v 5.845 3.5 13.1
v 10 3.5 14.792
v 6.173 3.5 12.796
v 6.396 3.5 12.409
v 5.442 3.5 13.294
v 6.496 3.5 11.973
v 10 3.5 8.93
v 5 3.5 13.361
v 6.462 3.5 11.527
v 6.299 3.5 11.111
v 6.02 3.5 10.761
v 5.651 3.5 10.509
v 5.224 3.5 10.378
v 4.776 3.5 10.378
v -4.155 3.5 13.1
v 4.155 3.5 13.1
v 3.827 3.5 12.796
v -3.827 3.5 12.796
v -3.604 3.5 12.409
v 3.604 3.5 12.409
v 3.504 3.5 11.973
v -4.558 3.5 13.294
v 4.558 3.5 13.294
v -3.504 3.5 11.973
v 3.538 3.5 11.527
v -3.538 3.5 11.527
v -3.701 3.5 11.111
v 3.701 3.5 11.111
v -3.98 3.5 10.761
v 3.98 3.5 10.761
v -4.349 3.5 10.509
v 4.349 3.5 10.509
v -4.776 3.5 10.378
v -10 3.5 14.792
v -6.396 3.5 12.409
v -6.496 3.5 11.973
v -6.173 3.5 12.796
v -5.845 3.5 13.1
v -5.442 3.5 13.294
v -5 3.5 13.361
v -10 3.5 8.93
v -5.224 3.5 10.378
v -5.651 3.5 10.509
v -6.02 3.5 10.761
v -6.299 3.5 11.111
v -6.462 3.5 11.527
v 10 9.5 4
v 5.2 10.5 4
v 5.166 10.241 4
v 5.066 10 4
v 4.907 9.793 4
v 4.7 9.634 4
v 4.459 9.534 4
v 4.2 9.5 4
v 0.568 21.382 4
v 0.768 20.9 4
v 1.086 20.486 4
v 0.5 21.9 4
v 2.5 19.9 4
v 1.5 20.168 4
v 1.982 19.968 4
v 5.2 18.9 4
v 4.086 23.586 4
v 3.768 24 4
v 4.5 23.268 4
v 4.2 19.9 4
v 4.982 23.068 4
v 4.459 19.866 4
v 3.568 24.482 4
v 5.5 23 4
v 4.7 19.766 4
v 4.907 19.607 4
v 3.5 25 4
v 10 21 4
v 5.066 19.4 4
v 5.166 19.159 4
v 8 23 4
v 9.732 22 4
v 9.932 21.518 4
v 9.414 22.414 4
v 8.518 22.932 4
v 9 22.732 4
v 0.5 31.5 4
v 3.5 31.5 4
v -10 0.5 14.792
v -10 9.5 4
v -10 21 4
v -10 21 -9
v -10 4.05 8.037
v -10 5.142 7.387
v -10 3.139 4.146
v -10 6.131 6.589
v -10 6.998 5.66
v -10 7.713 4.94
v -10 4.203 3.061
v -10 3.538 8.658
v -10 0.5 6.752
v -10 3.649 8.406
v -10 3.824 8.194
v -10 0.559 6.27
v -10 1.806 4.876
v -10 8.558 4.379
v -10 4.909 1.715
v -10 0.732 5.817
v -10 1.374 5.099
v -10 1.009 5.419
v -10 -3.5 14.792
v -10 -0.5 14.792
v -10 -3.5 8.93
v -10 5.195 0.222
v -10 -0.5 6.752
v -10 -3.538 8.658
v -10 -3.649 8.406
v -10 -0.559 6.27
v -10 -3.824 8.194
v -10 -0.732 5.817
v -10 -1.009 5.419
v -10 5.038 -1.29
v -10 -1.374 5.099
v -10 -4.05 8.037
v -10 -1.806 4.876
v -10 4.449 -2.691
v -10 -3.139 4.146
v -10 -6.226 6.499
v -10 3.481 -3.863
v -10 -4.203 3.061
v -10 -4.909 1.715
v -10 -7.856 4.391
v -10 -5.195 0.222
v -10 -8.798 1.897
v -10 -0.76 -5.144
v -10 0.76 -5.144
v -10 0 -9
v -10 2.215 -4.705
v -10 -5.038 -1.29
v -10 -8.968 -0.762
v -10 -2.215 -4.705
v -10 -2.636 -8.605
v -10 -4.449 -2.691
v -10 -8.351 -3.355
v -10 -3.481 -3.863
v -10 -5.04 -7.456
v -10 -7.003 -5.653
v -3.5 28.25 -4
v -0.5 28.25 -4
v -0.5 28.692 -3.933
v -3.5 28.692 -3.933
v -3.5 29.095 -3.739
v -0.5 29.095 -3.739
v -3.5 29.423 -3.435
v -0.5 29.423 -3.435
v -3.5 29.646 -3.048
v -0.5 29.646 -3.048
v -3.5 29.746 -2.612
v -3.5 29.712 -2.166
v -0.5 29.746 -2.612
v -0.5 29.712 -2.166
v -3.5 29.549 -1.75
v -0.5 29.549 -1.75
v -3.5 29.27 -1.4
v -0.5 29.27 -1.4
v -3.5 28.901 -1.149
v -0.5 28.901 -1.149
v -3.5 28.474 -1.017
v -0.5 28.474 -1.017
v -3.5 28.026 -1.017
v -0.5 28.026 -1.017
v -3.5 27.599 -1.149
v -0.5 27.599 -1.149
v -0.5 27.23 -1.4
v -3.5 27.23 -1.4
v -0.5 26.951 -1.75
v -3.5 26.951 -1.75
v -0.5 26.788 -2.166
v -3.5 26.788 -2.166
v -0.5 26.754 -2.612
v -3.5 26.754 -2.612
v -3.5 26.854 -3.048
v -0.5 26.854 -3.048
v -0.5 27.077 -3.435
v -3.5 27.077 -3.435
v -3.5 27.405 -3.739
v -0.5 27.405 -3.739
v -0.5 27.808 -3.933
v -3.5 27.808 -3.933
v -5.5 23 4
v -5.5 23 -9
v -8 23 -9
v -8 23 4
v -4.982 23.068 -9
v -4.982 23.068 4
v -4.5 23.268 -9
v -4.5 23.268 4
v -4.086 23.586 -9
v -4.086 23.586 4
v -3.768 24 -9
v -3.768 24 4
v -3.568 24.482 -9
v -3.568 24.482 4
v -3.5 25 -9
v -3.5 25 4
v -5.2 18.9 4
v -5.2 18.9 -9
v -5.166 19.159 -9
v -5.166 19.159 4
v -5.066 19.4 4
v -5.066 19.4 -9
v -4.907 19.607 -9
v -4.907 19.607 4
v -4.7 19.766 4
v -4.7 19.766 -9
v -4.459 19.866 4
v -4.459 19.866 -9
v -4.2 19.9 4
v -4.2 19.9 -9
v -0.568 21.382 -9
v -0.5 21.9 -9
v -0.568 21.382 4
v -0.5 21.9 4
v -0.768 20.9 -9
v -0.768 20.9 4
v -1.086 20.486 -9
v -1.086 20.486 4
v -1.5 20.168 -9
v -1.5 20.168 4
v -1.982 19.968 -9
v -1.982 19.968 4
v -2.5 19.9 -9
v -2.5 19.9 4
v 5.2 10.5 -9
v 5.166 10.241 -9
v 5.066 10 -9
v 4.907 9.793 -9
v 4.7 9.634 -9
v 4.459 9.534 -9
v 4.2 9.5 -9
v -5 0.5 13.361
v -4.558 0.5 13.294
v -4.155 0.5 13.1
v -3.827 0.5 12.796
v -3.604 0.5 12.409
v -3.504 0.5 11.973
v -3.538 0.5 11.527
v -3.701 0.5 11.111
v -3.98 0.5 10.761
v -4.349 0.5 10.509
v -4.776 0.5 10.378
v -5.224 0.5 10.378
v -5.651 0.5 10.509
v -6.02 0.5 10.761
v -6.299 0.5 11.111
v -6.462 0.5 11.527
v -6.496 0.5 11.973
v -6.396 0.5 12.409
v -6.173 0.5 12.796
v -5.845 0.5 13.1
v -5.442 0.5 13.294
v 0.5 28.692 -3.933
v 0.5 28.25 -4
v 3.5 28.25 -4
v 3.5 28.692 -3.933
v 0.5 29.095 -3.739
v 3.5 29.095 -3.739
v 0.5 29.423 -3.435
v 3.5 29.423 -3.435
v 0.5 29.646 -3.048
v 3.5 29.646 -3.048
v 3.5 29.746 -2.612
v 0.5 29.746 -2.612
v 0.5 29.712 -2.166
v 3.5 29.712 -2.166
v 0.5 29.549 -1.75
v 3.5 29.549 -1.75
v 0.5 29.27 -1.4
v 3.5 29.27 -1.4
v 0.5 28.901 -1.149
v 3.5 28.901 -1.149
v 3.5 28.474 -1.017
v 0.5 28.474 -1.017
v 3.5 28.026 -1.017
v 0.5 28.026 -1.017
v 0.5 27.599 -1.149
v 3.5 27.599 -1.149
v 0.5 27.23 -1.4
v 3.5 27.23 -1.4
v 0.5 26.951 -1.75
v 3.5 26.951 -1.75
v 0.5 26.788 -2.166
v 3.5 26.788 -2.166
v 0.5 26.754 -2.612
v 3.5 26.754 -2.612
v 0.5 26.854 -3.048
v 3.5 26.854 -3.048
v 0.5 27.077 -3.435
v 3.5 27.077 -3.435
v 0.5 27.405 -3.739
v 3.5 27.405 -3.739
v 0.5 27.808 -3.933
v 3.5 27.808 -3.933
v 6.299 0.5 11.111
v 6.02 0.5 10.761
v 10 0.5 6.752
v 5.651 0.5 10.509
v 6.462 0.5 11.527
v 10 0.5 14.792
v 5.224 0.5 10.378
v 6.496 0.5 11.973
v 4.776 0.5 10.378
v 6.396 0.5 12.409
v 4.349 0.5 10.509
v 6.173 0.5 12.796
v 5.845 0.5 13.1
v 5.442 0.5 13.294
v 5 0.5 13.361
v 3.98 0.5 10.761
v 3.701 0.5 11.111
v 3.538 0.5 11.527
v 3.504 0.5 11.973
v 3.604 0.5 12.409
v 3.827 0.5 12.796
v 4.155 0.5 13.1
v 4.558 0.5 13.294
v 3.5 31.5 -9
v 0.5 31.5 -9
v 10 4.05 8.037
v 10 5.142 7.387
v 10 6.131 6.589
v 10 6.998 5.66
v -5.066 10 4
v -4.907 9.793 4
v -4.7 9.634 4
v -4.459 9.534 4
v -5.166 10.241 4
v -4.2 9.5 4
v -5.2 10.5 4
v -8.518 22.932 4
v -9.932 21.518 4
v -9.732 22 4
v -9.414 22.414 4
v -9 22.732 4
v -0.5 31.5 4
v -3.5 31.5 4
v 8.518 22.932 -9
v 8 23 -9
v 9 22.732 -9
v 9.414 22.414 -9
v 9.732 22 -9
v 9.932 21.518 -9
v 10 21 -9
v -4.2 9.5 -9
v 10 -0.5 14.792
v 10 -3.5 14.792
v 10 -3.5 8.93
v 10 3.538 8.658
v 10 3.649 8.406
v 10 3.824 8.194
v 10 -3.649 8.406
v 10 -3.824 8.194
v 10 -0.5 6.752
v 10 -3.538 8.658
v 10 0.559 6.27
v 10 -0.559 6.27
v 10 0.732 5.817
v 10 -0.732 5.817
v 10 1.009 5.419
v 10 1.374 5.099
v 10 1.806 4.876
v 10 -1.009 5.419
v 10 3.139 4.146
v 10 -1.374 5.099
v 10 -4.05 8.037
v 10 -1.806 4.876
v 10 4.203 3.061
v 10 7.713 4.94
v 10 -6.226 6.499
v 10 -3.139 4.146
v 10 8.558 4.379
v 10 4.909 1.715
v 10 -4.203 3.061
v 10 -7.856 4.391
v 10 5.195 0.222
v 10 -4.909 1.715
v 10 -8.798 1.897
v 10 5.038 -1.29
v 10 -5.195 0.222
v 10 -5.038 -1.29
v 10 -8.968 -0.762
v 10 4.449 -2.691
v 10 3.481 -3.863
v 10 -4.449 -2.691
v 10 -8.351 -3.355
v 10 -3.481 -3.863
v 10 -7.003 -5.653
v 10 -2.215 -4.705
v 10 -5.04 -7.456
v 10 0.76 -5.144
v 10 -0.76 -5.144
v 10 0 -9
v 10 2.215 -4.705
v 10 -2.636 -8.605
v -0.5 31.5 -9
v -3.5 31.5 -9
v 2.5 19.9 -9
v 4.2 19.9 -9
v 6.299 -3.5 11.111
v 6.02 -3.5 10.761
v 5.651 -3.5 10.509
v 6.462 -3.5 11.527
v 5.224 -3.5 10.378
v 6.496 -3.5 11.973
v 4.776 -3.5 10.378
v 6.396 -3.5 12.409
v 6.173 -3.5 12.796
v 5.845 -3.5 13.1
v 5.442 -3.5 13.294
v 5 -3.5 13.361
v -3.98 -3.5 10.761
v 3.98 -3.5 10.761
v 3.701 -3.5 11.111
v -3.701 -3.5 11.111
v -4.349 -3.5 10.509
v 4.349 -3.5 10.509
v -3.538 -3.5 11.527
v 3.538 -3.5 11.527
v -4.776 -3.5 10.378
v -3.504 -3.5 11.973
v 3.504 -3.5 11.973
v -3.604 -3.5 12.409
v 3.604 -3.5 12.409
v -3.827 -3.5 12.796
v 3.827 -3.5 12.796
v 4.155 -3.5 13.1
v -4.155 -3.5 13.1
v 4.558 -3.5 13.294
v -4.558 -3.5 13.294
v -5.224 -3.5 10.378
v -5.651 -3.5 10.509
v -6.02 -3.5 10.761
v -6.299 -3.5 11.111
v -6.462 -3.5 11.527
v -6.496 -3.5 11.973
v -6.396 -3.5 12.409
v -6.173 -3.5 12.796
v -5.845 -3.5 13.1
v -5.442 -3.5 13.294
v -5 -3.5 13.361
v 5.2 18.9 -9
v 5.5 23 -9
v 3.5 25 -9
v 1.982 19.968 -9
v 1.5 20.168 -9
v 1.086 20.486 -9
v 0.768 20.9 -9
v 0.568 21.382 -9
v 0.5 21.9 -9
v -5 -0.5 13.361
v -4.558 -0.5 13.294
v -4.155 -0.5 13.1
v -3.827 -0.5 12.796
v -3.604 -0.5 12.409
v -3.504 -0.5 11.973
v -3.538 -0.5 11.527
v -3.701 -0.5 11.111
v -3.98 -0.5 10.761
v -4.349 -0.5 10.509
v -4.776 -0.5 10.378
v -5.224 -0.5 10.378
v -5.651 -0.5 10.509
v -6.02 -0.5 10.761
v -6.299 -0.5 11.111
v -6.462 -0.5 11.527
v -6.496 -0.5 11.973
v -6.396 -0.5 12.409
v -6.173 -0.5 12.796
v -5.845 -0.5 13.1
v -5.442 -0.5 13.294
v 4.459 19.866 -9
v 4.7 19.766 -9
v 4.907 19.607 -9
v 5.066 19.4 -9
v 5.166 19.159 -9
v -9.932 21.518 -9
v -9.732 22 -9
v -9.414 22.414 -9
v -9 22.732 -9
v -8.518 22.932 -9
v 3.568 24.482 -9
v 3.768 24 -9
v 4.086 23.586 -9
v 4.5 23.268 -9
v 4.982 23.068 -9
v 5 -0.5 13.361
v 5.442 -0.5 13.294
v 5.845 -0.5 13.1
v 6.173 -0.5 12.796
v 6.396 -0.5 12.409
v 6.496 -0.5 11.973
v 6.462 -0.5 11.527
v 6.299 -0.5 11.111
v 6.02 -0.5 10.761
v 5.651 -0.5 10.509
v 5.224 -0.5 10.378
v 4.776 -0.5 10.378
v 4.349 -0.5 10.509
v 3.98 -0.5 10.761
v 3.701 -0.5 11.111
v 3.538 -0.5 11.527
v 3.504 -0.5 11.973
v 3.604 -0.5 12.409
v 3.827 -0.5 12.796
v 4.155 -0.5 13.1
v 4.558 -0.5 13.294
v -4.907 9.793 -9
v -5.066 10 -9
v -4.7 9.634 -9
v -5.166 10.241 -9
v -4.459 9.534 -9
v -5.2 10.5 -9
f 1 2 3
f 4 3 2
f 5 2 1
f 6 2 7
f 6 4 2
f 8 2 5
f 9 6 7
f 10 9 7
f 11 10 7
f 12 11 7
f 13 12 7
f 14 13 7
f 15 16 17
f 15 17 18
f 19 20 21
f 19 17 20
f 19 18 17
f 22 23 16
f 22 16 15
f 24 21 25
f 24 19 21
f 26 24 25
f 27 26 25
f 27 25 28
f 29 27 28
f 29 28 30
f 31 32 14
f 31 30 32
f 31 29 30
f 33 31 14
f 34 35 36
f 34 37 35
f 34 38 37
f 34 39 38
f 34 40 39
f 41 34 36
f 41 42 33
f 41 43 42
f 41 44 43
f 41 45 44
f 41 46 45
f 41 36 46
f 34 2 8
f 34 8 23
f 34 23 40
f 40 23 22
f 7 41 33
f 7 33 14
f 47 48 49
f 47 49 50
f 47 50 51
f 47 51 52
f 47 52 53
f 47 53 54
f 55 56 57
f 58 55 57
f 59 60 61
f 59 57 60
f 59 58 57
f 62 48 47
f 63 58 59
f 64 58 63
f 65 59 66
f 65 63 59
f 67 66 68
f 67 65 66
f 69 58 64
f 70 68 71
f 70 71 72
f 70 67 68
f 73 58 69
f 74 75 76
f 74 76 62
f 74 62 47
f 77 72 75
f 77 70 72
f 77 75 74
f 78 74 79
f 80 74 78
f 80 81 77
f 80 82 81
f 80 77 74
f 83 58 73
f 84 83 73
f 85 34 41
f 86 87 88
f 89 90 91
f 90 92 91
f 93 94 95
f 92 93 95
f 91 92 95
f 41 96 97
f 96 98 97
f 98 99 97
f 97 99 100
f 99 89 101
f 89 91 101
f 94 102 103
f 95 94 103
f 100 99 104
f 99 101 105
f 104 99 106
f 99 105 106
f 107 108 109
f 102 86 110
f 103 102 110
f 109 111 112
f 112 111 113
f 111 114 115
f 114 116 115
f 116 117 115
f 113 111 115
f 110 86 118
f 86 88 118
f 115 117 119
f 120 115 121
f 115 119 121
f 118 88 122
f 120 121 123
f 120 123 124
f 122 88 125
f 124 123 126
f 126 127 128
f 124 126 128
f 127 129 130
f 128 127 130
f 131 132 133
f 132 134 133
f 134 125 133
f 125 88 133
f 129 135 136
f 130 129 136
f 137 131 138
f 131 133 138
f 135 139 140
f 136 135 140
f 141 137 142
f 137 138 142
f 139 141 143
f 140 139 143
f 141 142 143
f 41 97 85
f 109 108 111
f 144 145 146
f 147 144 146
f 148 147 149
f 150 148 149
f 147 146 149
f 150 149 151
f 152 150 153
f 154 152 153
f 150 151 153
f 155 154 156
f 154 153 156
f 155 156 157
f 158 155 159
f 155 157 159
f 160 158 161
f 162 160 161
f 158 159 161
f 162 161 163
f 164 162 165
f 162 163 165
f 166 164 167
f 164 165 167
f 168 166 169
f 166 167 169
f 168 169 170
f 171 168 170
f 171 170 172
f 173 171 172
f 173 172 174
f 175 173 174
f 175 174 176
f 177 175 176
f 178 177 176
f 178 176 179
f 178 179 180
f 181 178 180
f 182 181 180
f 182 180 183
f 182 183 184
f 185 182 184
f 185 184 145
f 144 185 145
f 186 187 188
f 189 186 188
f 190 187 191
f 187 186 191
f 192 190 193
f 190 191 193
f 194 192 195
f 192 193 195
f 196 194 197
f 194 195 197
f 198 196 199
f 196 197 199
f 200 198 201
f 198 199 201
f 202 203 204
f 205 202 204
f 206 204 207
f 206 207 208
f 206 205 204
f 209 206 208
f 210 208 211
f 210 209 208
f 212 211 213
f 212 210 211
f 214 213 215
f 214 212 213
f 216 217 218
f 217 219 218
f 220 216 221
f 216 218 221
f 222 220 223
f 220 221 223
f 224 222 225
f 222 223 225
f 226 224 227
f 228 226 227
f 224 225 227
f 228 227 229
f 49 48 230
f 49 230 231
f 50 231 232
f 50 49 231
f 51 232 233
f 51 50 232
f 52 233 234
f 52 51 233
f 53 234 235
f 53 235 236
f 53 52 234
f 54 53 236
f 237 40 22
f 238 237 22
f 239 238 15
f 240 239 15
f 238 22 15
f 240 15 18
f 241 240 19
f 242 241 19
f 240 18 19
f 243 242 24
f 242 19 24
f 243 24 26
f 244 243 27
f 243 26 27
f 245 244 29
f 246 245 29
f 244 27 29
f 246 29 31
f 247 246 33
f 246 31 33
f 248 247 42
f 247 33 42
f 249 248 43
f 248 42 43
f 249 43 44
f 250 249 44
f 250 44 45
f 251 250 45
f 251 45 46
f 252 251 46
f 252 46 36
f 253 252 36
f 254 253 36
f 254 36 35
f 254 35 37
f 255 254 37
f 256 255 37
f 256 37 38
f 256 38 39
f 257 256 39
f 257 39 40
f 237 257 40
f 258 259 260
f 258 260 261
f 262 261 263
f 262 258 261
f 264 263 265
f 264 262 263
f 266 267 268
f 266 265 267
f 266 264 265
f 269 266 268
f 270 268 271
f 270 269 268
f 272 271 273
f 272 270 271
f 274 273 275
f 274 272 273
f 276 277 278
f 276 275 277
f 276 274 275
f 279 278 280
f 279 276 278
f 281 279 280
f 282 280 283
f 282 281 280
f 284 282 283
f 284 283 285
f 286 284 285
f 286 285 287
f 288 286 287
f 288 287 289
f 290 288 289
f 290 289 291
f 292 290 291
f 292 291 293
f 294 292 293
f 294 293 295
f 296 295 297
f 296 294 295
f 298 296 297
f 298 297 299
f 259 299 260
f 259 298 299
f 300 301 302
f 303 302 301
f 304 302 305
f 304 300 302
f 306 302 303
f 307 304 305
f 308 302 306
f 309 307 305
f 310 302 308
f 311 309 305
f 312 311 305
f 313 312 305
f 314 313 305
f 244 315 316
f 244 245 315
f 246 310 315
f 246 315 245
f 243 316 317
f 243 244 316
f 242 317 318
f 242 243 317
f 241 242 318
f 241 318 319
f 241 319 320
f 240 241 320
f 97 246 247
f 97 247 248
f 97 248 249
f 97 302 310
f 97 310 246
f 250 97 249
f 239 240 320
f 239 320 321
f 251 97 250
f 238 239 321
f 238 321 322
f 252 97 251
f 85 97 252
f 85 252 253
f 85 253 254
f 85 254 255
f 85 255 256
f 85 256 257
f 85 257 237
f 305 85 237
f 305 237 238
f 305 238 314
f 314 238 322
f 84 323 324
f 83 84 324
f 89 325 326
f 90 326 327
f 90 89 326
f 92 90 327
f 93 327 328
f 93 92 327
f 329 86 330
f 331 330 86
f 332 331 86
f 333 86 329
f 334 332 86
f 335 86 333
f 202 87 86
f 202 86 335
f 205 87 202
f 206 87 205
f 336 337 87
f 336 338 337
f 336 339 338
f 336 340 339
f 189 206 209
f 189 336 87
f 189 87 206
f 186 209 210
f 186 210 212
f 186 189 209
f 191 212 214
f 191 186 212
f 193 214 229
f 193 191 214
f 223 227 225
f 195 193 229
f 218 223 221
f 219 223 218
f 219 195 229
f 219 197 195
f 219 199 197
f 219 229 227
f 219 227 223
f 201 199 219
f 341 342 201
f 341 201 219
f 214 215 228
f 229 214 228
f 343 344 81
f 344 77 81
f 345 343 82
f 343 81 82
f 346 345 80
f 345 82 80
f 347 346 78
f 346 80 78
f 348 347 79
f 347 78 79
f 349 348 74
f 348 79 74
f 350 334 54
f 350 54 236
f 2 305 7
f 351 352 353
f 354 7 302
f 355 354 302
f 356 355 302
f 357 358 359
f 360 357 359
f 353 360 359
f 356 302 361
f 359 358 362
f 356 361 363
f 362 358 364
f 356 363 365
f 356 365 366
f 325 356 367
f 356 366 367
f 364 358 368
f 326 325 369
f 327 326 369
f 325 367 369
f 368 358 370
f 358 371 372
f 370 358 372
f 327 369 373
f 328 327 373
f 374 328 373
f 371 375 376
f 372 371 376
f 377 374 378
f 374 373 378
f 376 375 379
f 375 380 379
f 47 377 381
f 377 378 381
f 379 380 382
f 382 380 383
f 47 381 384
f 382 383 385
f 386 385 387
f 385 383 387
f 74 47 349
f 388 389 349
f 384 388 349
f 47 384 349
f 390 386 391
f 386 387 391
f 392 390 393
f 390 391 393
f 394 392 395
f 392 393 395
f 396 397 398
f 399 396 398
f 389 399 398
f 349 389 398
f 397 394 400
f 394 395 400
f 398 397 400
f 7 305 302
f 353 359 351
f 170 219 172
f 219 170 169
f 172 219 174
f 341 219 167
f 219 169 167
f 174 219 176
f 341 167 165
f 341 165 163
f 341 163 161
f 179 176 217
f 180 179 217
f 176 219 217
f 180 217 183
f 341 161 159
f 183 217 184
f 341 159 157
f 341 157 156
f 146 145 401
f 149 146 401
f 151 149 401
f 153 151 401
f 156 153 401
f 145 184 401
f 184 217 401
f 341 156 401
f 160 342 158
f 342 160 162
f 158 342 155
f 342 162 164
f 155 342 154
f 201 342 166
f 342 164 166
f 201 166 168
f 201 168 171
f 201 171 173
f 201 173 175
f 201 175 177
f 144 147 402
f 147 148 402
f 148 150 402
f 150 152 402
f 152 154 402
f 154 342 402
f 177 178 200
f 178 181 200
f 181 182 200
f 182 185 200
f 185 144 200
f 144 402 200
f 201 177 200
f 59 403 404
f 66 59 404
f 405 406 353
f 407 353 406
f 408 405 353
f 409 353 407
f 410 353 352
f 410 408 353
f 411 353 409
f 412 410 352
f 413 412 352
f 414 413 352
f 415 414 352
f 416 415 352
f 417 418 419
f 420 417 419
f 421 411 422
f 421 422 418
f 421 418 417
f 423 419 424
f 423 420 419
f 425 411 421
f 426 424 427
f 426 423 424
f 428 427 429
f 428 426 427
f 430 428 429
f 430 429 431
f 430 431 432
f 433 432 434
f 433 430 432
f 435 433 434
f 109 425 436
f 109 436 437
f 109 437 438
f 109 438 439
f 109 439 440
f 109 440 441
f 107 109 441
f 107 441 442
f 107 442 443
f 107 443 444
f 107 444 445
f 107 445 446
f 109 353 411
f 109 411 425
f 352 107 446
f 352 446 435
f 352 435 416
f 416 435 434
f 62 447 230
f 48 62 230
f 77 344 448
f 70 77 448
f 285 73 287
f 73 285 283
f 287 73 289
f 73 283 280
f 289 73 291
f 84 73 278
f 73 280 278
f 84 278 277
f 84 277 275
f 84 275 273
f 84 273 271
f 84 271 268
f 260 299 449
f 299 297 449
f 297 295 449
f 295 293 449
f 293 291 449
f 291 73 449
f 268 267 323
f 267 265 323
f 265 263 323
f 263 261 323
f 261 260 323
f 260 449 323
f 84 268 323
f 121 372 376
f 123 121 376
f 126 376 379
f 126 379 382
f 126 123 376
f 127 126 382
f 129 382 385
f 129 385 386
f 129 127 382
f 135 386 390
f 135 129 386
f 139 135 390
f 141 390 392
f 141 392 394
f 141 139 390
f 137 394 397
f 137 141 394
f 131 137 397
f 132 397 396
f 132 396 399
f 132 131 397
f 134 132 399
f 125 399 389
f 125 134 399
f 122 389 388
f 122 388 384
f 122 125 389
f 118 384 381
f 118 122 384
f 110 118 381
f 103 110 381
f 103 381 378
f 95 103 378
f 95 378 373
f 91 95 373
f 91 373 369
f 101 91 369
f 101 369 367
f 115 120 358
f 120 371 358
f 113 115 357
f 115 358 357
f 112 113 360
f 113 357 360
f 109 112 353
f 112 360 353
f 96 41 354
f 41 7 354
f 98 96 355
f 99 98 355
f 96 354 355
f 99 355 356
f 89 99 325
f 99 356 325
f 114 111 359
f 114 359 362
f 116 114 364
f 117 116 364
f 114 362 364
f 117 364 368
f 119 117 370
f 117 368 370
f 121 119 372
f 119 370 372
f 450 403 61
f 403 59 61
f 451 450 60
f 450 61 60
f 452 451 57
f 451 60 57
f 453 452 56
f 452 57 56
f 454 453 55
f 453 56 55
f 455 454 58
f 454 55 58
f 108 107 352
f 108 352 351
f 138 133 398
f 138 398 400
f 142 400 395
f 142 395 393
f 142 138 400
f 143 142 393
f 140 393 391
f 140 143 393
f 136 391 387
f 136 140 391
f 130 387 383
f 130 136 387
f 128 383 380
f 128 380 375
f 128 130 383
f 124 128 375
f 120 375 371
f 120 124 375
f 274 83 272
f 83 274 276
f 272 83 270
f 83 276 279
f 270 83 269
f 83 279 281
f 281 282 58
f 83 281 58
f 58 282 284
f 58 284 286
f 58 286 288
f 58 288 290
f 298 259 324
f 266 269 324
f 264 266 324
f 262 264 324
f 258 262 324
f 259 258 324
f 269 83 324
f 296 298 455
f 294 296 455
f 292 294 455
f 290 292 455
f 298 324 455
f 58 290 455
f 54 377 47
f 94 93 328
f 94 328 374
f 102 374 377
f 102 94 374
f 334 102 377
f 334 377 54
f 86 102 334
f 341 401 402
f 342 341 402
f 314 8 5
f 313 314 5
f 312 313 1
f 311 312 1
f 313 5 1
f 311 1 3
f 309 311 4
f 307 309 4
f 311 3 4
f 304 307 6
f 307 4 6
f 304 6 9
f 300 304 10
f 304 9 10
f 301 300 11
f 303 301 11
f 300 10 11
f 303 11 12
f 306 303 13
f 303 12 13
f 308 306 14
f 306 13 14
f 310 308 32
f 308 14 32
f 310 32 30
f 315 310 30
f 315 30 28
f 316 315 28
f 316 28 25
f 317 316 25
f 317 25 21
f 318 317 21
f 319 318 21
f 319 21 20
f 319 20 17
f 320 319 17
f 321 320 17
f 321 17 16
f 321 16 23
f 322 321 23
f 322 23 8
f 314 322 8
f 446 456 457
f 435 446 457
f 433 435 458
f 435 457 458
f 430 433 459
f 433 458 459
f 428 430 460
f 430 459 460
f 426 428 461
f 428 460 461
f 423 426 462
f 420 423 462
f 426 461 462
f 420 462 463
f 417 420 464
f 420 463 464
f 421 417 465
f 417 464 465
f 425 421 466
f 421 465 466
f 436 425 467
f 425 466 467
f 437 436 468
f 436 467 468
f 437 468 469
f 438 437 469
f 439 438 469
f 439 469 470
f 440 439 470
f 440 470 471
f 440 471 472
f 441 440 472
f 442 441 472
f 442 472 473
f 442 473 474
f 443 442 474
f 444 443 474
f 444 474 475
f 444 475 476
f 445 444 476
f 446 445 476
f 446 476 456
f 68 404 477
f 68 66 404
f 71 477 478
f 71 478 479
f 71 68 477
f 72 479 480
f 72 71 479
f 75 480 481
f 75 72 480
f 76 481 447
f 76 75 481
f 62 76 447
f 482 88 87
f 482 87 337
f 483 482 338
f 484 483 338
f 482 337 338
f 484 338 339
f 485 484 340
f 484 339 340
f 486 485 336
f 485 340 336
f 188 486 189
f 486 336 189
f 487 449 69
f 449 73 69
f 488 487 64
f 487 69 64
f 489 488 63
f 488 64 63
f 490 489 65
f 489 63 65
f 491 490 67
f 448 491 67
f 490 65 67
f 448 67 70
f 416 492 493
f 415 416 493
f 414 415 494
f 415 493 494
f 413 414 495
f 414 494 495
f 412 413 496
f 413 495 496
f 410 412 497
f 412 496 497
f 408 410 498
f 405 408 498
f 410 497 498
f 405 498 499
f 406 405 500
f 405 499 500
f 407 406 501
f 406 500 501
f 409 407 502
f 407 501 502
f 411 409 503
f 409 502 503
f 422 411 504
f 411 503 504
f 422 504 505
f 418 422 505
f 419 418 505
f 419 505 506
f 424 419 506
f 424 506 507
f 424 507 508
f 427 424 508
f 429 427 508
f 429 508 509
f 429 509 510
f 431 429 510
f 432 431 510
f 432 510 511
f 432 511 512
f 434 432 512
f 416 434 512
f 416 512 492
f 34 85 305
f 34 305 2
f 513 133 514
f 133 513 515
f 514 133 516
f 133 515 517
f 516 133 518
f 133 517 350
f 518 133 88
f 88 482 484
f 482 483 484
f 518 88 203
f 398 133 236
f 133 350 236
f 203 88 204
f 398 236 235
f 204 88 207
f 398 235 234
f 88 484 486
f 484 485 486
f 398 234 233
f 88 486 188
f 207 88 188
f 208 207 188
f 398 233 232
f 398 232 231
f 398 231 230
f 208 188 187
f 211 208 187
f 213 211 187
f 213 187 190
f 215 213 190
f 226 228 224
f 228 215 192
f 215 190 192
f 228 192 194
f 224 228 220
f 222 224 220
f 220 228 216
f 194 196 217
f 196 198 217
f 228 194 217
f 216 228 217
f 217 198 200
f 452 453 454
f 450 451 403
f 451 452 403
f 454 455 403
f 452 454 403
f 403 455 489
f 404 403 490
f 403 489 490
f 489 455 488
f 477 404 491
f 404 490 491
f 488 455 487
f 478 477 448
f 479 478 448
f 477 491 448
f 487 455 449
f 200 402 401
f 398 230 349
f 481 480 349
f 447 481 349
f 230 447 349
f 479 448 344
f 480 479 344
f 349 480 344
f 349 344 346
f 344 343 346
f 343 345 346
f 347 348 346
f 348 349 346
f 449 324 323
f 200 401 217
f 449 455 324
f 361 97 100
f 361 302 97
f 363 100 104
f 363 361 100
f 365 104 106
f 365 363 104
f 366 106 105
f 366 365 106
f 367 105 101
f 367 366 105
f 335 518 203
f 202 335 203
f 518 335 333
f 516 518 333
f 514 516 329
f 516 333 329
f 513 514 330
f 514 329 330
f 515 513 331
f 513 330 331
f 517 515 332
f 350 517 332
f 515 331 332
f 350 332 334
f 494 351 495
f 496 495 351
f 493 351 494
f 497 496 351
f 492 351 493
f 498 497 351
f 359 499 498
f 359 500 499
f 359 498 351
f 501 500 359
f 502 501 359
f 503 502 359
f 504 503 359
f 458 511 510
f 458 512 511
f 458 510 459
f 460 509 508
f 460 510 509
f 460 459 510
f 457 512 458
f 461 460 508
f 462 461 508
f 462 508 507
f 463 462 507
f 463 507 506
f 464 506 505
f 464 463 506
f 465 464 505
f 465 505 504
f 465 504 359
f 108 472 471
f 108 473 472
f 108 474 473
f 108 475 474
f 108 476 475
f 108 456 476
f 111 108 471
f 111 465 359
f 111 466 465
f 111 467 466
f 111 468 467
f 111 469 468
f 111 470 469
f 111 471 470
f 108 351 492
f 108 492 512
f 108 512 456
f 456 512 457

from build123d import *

# Parameters (mm, degrees)
BOSS_EXTRUDE1_DEPTH            = 10
BOSS_EXTRUDE1_DEPTH_BACK       = 10
FILLET1_R                      = 1
BOSS_EXTRUDE2_START            = -10
BOSS_EXTRUDE2_DEPTH            = 20
FILLET2_R                      = 5
BOSS_EXTRUDE3_DEPTH            = 4
BOSS_EXTRUDE3_DEPTH_BACK       = 9
FILLET3_R                      = 1
FILLET4_R                      = 2
CUT_EXTRUDE1_REACH             = 35.208
SKETCH4_R                      = 1.5
CUT_EXTRUDE2_REACH             = 38.208
SKETCH5_R                      = 1.5
CUT_EXTRUDE2_DIRECTION_2_REACH = 38.208
FILLET5_R                      = 2


with BuildPart() as part:
    # Sketch1 → Boss-Extrude1 (new, two sides: drawn at the far end of the back side and taken through both)
    with BuildSketch(Plane(origin=(0, 0, 0), x_dir=(0, 0, -1), z_dir=(1, 0, 0)).offset(-BOSS_EXTRUDE1_DEPTH_BACK)):
        with BuildLine():
            Line((-5.175905718, 0.5), (-14.791561976, 0.5))
            Line((-14.791561976, 0.5), (-14.791561976, 3.5))
            Line((-14.791561976, 3.5), (-8.291561976, 3.5))
            ThreePointArc((-8.291561976, 3.5), (9, 0), (-8.291561976, -3.5))
            Line((-8.291561976, -3.5), (-14.791561976, -3.5))
            Line((-14.791561976, -3.5), (-14.791561976, -0.5))
            Line((-14.791561976, -0.5), (-5.175905718, -0.5))
            ThreePointArc((-5.175905718, -0.5), (5.2, 0), (-5.175905718, 0.5))
        make_face()
    extrude(amount=BOSS_EXTRUDE1_DEPTH + BOSS_EXTRUDE1_DEPTH_BACK)

    # Fillet1
    fillet1_edges = [part.edges().sort_by_distance(p)[0] for p in [
        (0, 3.5, 8.291561976),
        (0, -3.5, 8.291561976),
    ]]
    fillet(fillet1_edges, radius=FILLET1_R)

    # Sketch2 → Boss-Extrude2 (add)
    with BuildSketch(Plane(origin=(0, 0, 0), x_dir=(0, 0, -1), z_dir=(1, 0, 0)).offset(BOSS_EXTRUDE2_START)):
        with BuildLine():
            Line((-4, 8.062257748), (-4, 9.5))
            Line((-4, 9.5), (4, 9.5))
            Line((4, 9.5), (9, 9.5))
            Line((9, 9.5), (9, 0))
            ThreePointArc((9, 0), (7.64852927, 4.74341649), (4, 8.062257748))
            Line((4, 8.062257748), (-4, 8.062257748))
        make_face()
    extrude(amount=BOSS_EXTRUDE2_DEPTH)

    # Fillet2
    # the kernel refuses this fillet: 5 mm, written as the material it adds along each edge
    with BuildSketch(Plane(origin=(-10, 8.062257748, 4), x_dir=(0, -0.5399133181781692, 0.8417206239922121), z_dir=(1, 0, 0))) as fillet2_piece_1:
        with BuildLine():
            CenterArc((2.519874472, -4.969901053), FILLET2_R, 96.289938273, 34.950941651)
            Line((-0.77625619, -1.210177305), (-0.842178803, -1.13498283))
            ThreePointArc((-0.842178803, -1.13498283), (-0.472300157, -0.551097321), (-0.084172062, 0.053991332))
            Line((-0.084172062, 0.053991332), (0.010955976, 0.099398021))
            ThreePointArc((0.010955976, 0.099398021), (0.986037837, 0.045821895), (1.961119698, 0.099398021))
            Line((1.961119698, 0.099398021), (1.972075674, 0))
        make_face()
    extrude(amount=20)

    # Sketch3 → Boss-Extrude3 (add, two sides: drawn at the far end of the back side and taken through both)
    with BuildSketch(Plane.XY.offset(-BOSS_EXTRUDE3_DEPTH_BACK)):
        Polygon((-5.2, 9.5), (-5.2, 19.9), (-0.5, 19.9), (-0.5, 31.5), (-3.5, 31.5), (-3.5, 23), (-10, 23), (-10, 9.5), align=None)
        Polygon((5.2, 19.9), (5.2, 9.5), (10, 9.5), (10, 23), (3.5, 23), (3.5, 31.5), (0.5, 31.5), (0.5, 19.9), align=None)
    extrude(amount=BOSS_EXTRUDE3_DEPTH + BOSS_EXTRUDE3_DEPTH_BACK)

    # Fillet3
    fillet3_edges = [part.edges().sort_by_distance(p)[0] for p in [
        (-5.2, 9.5, -2.5),
        (-5.2, 19.9, -2.5),
        (5.2, 19.9, -2.5),
        (5.2, 9.5, -2.5),
    ]]
    fillet(fillet3_edges, radius=FILLET3_R)

    # Fillet4
    fillet4_edges = [part.edges().sort_by_distance(p)[0] for p in [
        (-3.5, 23, -2.5),
        (-10, 23, -2.5),
        (10, 23, -2.5),
        (3.5, 23, -2.5),
    ]]
    fillet(fillet4_edges, radius=FILLET4_R)

    # Cut-Extrude1: up to this face of the body (flat: up to its plane)
    cut_extrude1_end = Plane(part.part.faces().sort_by_distance((0, -3.5, 11.860923763))[0])
    # Sketch4 → Cut-Extrude1 (cut, up to the picked face)
    with BuildSketch(Plane(origin=(0, 3.5, 0), x_dir=(1, 0, 0), z_dir=(0, 1, 0)), mode=Mode.PRIVATE) as cut_extrude1_sk1:
        with Locations(Location((-5, -11.860923763, 0), (0, 0, 270))):
            Circle(SKETCH4_R)
    cut_extrude1_tool1 = split(extrude(cut_extrude1_sk1.sketch, amount=-CUT_EXTRUDE1_REACH, mode=Mode.PRIVATE), bisect_by=cut_extrude1_end, keep=Keep.BOTH, mode=Mode.PRIVATE)
    # Sketch4 → Cut-Extrude1 (cut, up to the picked face)
    with BuildSketch(Plane(origin=(0, 3.5, 0), x_dir=(1, 0, 0), z_dir=(0, 1, 0)), mode=Mode.PRIVATE) as cut_extrude1_sk2:
        with Locations(Location((5, -11.860923763, 0), (0, 0, 270))):
            Circle(SKETCH4_R)
    cut_extrude1_tool2 = split(extrude(cut_extrude1_sk2.sketch, amount=-CUT_EXTRUDE1_REACH, mode=Mode.PRIVATE), bisect_by=cut_extrude1_end, keep=Keep.BOTH, mode=Mode.PRIVATE)
    add(cut_extrude1_tool1.solids().sort_by(Axis((-5, 3.5, 11.860924), (0, -1, 0)))[0], mode=Mode.SUBTRACT)
    add(cut_extrude1_tool2.solids().sort_by(Axis((5, 3.5, 11.860924), (0, -1, 0)))[0], mode=Mode.SUBTRACT)

    # Cut-Extrude2: up to this face of the body (flat: up to its plane)
    cut_extrude2_end = Plane(part.part.faces().sort_by_distance((-3.5, 28.25, -2.5))[0])
    # Sketch5 → Cut-Extrude2 (cut, up to the picked face)
    with BuildSketch(Plane(origin=(0, 0, 0), x_dir=(0, 0, -1), z_dir=(1, 0, 0)), mode=Mode.PRIVATE) as cut_extrude2_sk1:
        with Locations((2.5, 28.25)):
            Circle(SKETCH5_R)
    cut_extrude2_tool1 = split(extrude(cut_extrude2_sk1.sketch, amount=-CUT_EXTRUDE2_REACH, mode=Mode.PRIVATE), bisect_by=cut_extrude2_end, keep=Keep.BOTH, mode=Mode.PRIVATE)
    add(cut_extrude2_tool1.solids().sort_by(Axis((0, 28.25, -2.5), (-1, 0, 0)))[0], mode=Mode.SUBTRACT)

    # Cut-Extrude2 direction 2: up to this face of the body (flat: up to its plane)
    cut_extrude2_direction_2_end = Plane(part.part.faces().sort_by_distance((3.5, 28.25, -2.5))[0])
    # Sketch5 → Cut-Extrude2 direction 2 (cut, up to the picked face)
    with BuildSketch(Plane(origin=(0, 0, 0), x_dir=(0, 0, -1), z_dir=(1, 0, 0)), mode=Mode.PRIVATE) as cut_extrude2_direction_2_sk1:
        with Locations((2.5, 28.25)):
            Circle(SKETCH5_R)
    cut_extrude2_direction_2_tool1 = split(extrude(cut_extrude2_direction_2_sk1.sketch, amount=CUT_EXTRUDE2_DIRECTION_2_REACH, mode=Mode.PRIVATE), bisect_by=cut_extrude2_direction_2_end, keep=Keep.BOTH, mode=Mode.PRIVATE)
    add(cut_extrude2_direction_2_tool1.solids().sort_by(Axis((0, 28.25, -2.5), (1, 0, 0)))[0], mode=Mode.SUBTRACT)

    # Fillet5
    fillet5_edges = [part.edges().sort_by_distance(p)[0] for p in [
        (0, 0.5, 5.175905718),
        (0, -0.5, 5.175905718),
        (-0.5, 19.9, -2.5),
        (0.5, 19.9, -2.5),
    ]]
    fillet(fillet5_edges, radius=FILLET5_R)


solid = part.part
